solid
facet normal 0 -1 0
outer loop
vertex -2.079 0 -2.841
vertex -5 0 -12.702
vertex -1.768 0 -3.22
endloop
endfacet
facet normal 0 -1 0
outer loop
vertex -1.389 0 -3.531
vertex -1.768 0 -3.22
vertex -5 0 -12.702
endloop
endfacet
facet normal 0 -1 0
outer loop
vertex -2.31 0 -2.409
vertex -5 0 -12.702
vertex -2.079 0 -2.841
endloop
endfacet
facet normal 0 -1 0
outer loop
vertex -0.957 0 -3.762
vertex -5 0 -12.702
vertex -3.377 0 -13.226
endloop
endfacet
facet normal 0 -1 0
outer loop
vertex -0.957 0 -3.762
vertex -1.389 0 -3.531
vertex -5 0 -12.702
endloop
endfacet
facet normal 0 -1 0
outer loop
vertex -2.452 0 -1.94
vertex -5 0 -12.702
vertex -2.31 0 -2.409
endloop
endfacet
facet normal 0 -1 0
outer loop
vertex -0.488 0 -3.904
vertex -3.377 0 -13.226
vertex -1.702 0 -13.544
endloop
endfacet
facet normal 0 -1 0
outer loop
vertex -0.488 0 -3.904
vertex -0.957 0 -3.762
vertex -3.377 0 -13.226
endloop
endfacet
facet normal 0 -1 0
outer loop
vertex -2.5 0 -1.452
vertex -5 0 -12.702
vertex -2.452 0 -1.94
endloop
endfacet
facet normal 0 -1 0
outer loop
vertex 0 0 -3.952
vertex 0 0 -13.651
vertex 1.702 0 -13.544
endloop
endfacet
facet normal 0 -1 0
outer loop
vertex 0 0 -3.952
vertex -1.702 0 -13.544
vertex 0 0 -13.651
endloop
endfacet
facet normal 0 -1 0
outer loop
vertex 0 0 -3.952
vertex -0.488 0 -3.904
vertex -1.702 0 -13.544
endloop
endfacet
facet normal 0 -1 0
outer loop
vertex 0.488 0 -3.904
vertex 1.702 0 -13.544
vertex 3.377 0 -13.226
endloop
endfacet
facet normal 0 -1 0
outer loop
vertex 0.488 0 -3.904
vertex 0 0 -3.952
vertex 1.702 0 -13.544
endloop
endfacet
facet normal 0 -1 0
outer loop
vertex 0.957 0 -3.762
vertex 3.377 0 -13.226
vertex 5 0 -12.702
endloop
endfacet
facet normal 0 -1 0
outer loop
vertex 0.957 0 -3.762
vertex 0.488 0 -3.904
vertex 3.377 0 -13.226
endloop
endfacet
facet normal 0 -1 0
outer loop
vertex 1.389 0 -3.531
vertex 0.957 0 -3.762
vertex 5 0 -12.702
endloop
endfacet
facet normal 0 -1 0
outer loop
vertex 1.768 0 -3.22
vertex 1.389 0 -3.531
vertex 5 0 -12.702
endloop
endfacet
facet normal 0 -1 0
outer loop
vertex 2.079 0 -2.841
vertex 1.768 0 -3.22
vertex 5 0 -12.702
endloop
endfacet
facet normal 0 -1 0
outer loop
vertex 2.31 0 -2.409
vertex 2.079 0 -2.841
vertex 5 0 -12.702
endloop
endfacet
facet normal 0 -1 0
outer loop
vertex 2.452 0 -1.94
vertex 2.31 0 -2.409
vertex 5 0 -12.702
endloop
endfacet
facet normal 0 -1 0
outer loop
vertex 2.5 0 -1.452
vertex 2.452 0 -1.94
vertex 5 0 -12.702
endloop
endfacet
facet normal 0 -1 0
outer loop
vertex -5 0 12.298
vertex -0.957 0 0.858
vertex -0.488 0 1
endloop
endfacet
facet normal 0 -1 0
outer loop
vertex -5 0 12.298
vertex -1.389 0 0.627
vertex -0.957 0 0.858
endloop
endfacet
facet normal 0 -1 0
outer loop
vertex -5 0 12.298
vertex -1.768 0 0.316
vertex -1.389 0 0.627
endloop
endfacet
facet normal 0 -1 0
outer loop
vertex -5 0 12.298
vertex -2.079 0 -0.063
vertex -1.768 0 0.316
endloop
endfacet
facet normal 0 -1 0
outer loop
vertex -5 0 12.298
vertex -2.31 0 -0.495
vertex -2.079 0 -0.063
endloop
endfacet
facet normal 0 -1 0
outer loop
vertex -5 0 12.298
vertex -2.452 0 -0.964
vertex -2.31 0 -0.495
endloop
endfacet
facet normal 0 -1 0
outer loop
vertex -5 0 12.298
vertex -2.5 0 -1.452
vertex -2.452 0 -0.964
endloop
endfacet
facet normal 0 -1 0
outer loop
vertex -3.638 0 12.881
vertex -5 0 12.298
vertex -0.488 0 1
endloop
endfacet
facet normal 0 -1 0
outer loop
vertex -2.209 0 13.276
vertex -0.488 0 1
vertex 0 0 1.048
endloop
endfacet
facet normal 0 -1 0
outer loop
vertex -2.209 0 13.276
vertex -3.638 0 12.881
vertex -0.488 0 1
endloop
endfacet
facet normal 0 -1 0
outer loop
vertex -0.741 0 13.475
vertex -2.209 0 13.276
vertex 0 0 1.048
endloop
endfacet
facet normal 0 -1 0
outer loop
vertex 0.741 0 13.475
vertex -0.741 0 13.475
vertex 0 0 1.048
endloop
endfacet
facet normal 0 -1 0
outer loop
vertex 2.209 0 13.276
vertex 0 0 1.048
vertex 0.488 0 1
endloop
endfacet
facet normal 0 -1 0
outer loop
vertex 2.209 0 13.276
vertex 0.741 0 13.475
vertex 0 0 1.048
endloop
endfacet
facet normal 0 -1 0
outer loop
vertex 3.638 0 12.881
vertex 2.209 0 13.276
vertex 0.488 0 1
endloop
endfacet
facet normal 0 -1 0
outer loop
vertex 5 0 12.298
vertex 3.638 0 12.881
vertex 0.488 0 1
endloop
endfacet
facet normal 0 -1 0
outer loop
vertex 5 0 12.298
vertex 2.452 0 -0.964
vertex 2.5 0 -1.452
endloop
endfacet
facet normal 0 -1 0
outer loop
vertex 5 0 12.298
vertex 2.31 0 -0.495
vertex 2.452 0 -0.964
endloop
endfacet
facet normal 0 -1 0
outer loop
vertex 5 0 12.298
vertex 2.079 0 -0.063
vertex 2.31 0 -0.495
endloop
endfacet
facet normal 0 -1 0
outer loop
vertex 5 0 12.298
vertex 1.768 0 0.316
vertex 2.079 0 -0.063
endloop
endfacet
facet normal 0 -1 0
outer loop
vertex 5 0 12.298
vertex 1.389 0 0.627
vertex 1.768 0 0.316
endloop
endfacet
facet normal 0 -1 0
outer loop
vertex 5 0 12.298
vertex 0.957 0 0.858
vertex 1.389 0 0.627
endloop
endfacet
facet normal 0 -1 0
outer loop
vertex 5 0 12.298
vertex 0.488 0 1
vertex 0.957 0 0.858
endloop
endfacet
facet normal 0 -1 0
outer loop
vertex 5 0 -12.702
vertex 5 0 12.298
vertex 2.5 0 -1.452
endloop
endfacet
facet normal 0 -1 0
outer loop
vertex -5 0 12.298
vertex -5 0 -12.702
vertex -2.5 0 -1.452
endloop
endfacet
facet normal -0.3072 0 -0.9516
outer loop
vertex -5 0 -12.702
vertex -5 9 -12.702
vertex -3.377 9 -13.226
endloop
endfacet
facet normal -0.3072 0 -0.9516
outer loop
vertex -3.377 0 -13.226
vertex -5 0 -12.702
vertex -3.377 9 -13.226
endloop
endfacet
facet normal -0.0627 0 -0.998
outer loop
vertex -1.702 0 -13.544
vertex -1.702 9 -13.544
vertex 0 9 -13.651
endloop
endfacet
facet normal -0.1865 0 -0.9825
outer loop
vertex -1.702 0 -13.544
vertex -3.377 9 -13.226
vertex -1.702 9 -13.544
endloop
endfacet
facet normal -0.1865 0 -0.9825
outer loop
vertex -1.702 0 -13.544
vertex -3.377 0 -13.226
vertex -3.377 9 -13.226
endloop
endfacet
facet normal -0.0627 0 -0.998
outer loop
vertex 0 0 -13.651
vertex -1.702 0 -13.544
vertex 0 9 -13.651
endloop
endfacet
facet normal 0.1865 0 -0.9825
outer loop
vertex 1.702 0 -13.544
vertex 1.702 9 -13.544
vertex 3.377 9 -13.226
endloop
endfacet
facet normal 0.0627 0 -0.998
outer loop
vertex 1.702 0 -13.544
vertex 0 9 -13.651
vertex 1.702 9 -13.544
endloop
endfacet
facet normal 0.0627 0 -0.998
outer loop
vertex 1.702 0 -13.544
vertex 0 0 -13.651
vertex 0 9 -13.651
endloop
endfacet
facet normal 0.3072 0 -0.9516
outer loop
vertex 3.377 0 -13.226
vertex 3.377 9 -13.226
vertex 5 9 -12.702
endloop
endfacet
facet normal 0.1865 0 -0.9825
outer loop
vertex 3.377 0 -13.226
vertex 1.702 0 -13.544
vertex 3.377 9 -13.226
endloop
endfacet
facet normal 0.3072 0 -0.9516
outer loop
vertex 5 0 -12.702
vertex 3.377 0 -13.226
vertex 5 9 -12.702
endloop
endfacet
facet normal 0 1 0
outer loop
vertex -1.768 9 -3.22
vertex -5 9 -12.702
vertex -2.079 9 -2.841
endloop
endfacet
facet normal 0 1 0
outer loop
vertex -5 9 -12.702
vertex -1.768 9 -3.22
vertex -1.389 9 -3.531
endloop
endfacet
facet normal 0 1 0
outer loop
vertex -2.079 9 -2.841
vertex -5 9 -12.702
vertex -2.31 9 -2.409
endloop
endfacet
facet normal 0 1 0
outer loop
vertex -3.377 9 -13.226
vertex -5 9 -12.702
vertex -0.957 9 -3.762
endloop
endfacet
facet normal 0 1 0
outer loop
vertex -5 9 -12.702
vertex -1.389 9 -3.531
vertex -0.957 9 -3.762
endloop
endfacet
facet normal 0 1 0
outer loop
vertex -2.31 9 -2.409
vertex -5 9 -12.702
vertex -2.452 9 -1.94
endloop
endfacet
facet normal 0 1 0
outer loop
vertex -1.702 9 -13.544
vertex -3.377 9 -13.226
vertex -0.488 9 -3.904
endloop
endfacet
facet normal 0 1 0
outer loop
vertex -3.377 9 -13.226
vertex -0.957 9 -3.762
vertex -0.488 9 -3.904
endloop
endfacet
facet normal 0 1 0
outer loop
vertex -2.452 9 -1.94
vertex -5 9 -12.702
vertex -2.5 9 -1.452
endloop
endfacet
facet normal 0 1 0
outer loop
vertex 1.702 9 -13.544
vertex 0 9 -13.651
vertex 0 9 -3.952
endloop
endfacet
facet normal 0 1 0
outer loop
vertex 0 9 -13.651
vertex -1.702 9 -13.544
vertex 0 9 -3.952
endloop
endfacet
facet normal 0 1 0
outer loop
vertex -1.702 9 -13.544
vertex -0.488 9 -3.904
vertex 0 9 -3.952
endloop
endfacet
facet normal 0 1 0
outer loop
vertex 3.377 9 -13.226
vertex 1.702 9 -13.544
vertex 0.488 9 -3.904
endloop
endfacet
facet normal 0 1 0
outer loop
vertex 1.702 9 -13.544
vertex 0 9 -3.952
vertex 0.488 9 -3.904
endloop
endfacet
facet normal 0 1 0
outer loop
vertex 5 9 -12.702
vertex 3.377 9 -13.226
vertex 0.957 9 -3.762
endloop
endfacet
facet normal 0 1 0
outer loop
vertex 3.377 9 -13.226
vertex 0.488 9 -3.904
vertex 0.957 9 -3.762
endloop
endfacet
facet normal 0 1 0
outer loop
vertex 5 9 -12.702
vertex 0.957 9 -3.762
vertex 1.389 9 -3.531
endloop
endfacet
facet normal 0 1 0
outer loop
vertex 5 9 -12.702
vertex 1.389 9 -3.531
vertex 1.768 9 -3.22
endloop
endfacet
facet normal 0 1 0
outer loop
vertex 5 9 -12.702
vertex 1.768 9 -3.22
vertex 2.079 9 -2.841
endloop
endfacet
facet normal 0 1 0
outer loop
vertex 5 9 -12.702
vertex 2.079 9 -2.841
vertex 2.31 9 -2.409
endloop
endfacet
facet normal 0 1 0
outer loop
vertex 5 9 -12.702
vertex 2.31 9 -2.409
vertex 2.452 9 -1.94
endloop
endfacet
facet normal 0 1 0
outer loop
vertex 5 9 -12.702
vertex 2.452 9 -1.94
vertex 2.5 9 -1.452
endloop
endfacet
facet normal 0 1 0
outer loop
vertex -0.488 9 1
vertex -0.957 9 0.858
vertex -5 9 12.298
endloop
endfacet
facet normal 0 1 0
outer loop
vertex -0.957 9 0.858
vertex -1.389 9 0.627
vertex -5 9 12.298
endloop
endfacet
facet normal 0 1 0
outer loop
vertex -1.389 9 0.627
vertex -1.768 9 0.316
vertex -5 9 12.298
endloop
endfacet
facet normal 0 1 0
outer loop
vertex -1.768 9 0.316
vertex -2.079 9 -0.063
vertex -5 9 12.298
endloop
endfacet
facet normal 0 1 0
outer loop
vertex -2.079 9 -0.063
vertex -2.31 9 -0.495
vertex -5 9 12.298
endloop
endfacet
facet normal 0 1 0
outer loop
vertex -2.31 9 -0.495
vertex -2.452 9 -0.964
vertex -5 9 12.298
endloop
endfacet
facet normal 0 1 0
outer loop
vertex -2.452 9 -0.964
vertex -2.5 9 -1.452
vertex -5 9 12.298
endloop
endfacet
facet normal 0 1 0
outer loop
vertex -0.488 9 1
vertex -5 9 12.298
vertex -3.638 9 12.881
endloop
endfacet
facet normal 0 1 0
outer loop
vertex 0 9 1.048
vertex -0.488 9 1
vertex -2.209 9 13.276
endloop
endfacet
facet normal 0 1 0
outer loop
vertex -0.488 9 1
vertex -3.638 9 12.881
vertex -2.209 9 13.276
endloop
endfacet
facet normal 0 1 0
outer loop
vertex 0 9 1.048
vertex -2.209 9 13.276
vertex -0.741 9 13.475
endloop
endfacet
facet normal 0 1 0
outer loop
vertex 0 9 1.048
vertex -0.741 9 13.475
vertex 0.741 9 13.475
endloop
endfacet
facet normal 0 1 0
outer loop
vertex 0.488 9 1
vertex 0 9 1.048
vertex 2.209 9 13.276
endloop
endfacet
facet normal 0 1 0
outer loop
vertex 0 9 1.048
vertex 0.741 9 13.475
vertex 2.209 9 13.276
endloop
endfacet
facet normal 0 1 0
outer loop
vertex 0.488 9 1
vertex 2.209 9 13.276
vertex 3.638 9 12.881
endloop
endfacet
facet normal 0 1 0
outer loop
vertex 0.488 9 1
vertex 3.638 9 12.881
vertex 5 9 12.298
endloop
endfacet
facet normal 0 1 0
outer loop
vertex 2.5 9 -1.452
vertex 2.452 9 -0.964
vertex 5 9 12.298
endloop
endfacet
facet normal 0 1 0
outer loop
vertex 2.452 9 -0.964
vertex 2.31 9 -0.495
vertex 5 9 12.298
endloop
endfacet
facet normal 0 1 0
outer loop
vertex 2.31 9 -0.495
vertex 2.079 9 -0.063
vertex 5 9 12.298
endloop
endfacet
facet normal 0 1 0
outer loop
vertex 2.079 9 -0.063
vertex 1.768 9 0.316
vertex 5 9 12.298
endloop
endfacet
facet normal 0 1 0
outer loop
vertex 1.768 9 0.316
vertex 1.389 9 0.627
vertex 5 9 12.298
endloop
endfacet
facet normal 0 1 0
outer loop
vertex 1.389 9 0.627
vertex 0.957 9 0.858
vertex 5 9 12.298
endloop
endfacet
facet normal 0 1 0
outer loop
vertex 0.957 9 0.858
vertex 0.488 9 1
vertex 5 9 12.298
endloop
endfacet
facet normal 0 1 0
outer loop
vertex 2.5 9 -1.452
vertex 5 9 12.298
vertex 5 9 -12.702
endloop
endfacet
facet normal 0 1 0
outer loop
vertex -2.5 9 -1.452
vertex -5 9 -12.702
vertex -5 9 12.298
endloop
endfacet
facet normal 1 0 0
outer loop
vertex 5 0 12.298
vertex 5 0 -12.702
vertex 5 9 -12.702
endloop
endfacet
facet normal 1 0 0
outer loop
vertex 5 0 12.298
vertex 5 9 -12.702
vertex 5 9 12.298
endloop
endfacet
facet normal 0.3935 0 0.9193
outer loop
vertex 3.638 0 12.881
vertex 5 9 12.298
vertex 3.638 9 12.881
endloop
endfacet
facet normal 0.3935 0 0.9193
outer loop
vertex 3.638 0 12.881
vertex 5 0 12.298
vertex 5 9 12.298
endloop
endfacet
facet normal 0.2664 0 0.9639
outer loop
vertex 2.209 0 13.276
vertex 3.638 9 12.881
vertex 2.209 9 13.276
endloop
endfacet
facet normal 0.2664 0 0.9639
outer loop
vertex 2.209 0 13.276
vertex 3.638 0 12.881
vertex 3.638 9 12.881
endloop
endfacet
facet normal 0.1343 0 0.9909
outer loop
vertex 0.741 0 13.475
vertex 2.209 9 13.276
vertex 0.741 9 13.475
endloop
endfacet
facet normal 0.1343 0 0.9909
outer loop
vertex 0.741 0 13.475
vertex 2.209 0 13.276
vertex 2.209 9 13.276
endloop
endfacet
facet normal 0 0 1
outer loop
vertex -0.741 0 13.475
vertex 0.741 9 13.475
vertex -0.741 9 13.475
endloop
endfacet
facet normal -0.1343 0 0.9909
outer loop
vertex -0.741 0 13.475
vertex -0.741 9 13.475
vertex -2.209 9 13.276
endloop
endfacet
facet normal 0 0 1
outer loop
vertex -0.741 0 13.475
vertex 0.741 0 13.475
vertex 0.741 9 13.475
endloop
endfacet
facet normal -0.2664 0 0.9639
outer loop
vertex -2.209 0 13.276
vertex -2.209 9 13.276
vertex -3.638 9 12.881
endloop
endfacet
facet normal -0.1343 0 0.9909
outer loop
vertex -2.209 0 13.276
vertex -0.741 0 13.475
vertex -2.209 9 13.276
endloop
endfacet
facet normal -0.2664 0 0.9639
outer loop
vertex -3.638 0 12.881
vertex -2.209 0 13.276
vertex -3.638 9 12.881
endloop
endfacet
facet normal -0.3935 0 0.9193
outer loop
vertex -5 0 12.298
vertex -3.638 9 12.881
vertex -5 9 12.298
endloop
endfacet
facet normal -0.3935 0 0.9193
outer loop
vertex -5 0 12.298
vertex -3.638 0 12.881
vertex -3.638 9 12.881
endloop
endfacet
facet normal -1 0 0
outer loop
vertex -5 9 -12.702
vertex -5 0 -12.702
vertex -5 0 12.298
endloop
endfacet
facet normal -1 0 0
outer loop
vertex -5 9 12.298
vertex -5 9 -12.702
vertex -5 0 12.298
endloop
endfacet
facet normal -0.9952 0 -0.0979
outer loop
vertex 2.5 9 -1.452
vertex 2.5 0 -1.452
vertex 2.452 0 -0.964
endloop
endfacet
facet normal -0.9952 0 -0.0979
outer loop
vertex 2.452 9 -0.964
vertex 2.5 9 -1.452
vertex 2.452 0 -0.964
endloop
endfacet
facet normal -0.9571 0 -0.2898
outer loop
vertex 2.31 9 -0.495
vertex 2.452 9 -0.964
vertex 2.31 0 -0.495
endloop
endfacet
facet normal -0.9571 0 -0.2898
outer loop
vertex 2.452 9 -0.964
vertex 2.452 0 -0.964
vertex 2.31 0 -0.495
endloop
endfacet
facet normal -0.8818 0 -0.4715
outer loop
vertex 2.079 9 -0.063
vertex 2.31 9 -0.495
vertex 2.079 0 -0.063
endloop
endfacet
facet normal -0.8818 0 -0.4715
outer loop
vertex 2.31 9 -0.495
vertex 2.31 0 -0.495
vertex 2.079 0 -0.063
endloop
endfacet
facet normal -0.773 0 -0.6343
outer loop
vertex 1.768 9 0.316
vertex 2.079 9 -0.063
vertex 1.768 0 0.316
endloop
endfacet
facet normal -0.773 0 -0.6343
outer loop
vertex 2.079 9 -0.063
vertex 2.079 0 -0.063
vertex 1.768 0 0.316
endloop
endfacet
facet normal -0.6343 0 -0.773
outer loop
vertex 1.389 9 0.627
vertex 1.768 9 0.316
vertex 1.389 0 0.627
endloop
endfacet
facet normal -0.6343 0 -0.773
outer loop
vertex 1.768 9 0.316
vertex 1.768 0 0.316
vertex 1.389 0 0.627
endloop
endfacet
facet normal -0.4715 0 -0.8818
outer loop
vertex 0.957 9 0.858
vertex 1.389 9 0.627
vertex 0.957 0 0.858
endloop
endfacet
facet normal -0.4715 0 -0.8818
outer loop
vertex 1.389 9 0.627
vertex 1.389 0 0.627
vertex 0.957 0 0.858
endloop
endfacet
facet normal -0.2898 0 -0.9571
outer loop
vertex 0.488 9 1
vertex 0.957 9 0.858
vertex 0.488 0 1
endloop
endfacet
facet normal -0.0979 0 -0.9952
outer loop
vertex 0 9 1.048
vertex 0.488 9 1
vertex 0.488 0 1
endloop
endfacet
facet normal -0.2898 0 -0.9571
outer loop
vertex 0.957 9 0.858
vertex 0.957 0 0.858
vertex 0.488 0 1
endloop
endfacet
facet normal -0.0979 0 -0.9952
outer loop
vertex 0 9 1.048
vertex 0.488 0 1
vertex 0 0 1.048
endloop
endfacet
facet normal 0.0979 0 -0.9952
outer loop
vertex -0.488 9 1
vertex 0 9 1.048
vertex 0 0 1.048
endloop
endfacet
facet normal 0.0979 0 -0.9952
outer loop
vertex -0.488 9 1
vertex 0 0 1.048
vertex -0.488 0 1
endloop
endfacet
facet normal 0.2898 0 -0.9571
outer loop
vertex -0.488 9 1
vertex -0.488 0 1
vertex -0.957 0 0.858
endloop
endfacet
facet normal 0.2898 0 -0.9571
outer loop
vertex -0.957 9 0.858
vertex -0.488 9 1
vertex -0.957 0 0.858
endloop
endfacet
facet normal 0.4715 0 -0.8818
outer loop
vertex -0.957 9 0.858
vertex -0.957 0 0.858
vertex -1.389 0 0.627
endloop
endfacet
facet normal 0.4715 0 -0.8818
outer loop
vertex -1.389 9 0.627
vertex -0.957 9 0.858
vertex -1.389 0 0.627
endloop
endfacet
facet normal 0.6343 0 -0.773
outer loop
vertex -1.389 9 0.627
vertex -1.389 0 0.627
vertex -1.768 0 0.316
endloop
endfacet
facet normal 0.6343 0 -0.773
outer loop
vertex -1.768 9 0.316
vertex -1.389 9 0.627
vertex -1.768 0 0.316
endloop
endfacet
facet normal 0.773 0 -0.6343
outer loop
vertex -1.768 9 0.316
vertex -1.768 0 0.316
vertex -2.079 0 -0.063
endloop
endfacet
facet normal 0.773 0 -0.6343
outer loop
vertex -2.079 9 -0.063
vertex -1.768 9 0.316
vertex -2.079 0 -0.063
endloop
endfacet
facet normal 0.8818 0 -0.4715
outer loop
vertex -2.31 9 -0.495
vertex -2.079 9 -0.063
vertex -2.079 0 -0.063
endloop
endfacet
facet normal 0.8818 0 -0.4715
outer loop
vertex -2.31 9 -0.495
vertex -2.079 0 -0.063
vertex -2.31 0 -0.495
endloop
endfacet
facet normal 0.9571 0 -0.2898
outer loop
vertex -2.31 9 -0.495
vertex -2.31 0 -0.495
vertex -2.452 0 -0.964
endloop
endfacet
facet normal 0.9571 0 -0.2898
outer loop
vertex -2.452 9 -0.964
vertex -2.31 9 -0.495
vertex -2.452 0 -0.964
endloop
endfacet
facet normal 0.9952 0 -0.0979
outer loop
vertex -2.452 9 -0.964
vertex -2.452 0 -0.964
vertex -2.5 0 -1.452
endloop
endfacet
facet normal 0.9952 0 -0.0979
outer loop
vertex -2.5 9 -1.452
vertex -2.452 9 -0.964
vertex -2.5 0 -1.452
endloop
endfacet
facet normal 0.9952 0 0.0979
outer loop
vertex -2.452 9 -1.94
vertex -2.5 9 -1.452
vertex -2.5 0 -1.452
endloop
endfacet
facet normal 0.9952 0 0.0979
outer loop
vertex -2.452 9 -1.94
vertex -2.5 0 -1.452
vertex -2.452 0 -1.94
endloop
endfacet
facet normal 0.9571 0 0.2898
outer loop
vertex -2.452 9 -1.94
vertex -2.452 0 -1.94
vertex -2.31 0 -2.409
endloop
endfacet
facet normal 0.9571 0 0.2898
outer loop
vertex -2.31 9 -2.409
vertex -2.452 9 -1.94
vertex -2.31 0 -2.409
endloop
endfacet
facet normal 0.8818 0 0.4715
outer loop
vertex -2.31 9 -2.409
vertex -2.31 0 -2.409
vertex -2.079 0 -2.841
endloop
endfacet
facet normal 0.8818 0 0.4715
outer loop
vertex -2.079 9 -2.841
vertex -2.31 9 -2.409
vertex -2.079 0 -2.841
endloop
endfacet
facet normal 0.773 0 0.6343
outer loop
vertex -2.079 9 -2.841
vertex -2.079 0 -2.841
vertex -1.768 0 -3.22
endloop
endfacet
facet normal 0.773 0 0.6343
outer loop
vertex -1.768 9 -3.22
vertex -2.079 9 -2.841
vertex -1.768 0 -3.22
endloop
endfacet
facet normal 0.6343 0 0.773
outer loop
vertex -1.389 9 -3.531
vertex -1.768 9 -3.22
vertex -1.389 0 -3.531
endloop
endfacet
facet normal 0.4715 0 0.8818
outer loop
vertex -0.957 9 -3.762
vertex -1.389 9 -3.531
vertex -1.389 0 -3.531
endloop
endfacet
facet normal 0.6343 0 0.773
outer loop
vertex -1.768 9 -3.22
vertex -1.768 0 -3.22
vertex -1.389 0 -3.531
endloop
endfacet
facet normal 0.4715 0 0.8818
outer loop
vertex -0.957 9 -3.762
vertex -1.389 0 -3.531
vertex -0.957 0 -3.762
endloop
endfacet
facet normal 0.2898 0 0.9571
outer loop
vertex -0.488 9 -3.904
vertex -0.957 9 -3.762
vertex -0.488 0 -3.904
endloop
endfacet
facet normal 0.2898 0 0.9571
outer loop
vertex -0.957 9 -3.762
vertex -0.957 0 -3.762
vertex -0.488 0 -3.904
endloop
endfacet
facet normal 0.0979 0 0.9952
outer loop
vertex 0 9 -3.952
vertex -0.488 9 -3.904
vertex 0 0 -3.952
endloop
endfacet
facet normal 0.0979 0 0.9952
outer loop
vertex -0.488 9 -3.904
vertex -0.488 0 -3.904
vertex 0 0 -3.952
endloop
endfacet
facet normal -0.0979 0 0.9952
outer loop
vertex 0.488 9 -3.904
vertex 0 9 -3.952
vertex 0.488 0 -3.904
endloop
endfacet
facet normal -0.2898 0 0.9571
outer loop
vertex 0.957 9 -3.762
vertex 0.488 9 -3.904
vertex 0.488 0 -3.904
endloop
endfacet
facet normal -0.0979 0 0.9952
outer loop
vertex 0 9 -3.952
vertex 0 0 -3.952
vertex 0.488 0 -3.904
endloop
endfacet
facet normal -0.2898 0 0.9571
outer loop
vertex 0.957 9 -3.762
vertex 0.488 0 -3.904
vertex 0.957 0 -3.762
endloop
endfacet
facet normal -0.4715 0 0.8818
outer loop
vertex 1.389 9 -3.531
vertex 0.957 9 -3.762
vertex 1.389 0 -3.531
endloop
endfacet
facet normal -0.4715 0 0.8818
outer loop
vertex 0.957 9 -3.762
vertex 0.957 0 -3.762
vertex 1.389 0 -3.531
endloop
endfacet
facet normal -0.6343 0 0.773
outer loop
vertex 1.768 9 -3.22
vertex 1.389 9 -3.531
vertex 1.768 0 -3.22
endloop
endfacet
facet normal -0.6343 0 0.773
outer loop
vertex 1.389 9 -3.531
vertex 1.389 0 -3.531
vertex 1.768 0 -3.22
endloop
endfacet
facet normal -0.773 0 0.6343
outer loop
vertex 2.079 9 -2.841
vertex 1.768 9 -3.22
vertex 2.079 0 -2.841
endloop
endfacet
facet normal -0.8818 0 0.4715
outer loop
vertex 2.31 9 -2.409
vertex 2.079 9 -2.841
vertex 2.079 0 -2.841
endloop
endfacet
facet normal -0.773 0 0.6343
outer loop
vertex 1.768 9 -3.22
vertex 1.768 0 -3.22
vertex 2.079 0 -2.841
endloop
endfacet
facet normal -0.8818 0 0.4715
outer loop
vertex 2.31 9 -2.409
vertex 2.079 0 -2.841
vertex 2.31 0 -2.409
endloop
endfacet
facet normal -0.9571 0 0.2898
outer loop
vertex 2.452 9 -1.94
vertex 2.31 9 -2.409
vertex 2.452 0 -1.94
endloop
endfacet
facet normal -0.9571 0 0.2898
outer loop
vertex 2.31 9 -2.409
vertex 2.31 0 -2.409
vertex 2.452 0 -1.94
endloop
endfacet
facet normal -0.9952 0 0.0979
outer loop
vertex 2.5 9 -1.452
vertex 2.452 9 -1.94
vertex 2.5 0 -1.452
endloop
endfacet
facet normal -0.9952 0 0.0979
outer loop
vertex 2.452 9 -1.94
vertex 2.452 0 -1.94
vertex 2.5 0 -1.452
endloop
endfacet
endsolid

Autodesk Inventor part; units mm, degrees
ref_plane "YZ Plane" through (0, 0, 0) normal (1, 0, 0) x (0, 1, 0)
ref_plane "XZ Plane" through (0, 0, 0) normal (0, 1, 0) x (-1, 0, 0)
ref_plane "XY Plane" through (0, 0, 0) normal (0, 0, 1) x (1, 0, 0)
sketch "Sketch1" plane through (0, 0, 0) normal (0, 1, 0) x (-1, 0, 0)
  line L0 (0, 0) -> (5, 0)
  line L1 (5, 0) -> (5, 9.798)
  line L2 (5, 0) -> (5, -12.702)
  line L3 (-5, -12.702) -> (-5, 9.798)
  arc A0 (5, 9.798) -> (-5, 9.798) centre (0, 0) ccw
  arc A1 (-5, -12.702) -> (5, -12.702) centre (0, 0) ccw
  dimension "d1" = 5
  dimension "d7" = 22.5
  dimension "d12" = 9.798
extrude "Extrusion1" add sketch "Sketch1" along normal blind 9
sketch "Sketch2" plane through (0, 0, 0) normal (0, -1, 0) x (1, 0, 0)
  line L0 (-5, -12.702) -> (-5, 9.798) projected
  line L1 (-5, -12.702) -> (-5, -1.452)
  circle A0 centre (0, -1.452) radius 2.5
  point P0 (0, 0)
  dimension "d8" = 11.25
  dimension "d9" = 5
extrude "Extrusion3" cut sketch "Sketch2" against normal blind 9
sketch "Sketch3" plane through (0, 0, 0) normal (0, -1, 0) x (1, 0, 0)
  line L0 (-5, -12.702) -> (-5, 9.798) projected
  line L1 (-5, 9.798) -> (-5, 12.298)
  line L2 (5, 9.798) -> (5, -12.702) projected
  line L3 (5, 9.798) -> (5, 12.298)
  arc A0 (5, 12.298) -> (-5, 12.298) centre (0, 2.5) ccw
  arc A1 (5, 9.798) -> (-5, 9.798) centre (0, 0) ccw projected
  arc A2 (5, 9.798) -> (-5, 9.798) centre (0, 0) ccw
  dimension "d13" = 2.5
  dimension "d14" = 2.5
  dimension "d15" = 11
extrude "Extrusion4" add sketch "Sketch3" against normal blind 9
properties part number "sHUFFLE"
